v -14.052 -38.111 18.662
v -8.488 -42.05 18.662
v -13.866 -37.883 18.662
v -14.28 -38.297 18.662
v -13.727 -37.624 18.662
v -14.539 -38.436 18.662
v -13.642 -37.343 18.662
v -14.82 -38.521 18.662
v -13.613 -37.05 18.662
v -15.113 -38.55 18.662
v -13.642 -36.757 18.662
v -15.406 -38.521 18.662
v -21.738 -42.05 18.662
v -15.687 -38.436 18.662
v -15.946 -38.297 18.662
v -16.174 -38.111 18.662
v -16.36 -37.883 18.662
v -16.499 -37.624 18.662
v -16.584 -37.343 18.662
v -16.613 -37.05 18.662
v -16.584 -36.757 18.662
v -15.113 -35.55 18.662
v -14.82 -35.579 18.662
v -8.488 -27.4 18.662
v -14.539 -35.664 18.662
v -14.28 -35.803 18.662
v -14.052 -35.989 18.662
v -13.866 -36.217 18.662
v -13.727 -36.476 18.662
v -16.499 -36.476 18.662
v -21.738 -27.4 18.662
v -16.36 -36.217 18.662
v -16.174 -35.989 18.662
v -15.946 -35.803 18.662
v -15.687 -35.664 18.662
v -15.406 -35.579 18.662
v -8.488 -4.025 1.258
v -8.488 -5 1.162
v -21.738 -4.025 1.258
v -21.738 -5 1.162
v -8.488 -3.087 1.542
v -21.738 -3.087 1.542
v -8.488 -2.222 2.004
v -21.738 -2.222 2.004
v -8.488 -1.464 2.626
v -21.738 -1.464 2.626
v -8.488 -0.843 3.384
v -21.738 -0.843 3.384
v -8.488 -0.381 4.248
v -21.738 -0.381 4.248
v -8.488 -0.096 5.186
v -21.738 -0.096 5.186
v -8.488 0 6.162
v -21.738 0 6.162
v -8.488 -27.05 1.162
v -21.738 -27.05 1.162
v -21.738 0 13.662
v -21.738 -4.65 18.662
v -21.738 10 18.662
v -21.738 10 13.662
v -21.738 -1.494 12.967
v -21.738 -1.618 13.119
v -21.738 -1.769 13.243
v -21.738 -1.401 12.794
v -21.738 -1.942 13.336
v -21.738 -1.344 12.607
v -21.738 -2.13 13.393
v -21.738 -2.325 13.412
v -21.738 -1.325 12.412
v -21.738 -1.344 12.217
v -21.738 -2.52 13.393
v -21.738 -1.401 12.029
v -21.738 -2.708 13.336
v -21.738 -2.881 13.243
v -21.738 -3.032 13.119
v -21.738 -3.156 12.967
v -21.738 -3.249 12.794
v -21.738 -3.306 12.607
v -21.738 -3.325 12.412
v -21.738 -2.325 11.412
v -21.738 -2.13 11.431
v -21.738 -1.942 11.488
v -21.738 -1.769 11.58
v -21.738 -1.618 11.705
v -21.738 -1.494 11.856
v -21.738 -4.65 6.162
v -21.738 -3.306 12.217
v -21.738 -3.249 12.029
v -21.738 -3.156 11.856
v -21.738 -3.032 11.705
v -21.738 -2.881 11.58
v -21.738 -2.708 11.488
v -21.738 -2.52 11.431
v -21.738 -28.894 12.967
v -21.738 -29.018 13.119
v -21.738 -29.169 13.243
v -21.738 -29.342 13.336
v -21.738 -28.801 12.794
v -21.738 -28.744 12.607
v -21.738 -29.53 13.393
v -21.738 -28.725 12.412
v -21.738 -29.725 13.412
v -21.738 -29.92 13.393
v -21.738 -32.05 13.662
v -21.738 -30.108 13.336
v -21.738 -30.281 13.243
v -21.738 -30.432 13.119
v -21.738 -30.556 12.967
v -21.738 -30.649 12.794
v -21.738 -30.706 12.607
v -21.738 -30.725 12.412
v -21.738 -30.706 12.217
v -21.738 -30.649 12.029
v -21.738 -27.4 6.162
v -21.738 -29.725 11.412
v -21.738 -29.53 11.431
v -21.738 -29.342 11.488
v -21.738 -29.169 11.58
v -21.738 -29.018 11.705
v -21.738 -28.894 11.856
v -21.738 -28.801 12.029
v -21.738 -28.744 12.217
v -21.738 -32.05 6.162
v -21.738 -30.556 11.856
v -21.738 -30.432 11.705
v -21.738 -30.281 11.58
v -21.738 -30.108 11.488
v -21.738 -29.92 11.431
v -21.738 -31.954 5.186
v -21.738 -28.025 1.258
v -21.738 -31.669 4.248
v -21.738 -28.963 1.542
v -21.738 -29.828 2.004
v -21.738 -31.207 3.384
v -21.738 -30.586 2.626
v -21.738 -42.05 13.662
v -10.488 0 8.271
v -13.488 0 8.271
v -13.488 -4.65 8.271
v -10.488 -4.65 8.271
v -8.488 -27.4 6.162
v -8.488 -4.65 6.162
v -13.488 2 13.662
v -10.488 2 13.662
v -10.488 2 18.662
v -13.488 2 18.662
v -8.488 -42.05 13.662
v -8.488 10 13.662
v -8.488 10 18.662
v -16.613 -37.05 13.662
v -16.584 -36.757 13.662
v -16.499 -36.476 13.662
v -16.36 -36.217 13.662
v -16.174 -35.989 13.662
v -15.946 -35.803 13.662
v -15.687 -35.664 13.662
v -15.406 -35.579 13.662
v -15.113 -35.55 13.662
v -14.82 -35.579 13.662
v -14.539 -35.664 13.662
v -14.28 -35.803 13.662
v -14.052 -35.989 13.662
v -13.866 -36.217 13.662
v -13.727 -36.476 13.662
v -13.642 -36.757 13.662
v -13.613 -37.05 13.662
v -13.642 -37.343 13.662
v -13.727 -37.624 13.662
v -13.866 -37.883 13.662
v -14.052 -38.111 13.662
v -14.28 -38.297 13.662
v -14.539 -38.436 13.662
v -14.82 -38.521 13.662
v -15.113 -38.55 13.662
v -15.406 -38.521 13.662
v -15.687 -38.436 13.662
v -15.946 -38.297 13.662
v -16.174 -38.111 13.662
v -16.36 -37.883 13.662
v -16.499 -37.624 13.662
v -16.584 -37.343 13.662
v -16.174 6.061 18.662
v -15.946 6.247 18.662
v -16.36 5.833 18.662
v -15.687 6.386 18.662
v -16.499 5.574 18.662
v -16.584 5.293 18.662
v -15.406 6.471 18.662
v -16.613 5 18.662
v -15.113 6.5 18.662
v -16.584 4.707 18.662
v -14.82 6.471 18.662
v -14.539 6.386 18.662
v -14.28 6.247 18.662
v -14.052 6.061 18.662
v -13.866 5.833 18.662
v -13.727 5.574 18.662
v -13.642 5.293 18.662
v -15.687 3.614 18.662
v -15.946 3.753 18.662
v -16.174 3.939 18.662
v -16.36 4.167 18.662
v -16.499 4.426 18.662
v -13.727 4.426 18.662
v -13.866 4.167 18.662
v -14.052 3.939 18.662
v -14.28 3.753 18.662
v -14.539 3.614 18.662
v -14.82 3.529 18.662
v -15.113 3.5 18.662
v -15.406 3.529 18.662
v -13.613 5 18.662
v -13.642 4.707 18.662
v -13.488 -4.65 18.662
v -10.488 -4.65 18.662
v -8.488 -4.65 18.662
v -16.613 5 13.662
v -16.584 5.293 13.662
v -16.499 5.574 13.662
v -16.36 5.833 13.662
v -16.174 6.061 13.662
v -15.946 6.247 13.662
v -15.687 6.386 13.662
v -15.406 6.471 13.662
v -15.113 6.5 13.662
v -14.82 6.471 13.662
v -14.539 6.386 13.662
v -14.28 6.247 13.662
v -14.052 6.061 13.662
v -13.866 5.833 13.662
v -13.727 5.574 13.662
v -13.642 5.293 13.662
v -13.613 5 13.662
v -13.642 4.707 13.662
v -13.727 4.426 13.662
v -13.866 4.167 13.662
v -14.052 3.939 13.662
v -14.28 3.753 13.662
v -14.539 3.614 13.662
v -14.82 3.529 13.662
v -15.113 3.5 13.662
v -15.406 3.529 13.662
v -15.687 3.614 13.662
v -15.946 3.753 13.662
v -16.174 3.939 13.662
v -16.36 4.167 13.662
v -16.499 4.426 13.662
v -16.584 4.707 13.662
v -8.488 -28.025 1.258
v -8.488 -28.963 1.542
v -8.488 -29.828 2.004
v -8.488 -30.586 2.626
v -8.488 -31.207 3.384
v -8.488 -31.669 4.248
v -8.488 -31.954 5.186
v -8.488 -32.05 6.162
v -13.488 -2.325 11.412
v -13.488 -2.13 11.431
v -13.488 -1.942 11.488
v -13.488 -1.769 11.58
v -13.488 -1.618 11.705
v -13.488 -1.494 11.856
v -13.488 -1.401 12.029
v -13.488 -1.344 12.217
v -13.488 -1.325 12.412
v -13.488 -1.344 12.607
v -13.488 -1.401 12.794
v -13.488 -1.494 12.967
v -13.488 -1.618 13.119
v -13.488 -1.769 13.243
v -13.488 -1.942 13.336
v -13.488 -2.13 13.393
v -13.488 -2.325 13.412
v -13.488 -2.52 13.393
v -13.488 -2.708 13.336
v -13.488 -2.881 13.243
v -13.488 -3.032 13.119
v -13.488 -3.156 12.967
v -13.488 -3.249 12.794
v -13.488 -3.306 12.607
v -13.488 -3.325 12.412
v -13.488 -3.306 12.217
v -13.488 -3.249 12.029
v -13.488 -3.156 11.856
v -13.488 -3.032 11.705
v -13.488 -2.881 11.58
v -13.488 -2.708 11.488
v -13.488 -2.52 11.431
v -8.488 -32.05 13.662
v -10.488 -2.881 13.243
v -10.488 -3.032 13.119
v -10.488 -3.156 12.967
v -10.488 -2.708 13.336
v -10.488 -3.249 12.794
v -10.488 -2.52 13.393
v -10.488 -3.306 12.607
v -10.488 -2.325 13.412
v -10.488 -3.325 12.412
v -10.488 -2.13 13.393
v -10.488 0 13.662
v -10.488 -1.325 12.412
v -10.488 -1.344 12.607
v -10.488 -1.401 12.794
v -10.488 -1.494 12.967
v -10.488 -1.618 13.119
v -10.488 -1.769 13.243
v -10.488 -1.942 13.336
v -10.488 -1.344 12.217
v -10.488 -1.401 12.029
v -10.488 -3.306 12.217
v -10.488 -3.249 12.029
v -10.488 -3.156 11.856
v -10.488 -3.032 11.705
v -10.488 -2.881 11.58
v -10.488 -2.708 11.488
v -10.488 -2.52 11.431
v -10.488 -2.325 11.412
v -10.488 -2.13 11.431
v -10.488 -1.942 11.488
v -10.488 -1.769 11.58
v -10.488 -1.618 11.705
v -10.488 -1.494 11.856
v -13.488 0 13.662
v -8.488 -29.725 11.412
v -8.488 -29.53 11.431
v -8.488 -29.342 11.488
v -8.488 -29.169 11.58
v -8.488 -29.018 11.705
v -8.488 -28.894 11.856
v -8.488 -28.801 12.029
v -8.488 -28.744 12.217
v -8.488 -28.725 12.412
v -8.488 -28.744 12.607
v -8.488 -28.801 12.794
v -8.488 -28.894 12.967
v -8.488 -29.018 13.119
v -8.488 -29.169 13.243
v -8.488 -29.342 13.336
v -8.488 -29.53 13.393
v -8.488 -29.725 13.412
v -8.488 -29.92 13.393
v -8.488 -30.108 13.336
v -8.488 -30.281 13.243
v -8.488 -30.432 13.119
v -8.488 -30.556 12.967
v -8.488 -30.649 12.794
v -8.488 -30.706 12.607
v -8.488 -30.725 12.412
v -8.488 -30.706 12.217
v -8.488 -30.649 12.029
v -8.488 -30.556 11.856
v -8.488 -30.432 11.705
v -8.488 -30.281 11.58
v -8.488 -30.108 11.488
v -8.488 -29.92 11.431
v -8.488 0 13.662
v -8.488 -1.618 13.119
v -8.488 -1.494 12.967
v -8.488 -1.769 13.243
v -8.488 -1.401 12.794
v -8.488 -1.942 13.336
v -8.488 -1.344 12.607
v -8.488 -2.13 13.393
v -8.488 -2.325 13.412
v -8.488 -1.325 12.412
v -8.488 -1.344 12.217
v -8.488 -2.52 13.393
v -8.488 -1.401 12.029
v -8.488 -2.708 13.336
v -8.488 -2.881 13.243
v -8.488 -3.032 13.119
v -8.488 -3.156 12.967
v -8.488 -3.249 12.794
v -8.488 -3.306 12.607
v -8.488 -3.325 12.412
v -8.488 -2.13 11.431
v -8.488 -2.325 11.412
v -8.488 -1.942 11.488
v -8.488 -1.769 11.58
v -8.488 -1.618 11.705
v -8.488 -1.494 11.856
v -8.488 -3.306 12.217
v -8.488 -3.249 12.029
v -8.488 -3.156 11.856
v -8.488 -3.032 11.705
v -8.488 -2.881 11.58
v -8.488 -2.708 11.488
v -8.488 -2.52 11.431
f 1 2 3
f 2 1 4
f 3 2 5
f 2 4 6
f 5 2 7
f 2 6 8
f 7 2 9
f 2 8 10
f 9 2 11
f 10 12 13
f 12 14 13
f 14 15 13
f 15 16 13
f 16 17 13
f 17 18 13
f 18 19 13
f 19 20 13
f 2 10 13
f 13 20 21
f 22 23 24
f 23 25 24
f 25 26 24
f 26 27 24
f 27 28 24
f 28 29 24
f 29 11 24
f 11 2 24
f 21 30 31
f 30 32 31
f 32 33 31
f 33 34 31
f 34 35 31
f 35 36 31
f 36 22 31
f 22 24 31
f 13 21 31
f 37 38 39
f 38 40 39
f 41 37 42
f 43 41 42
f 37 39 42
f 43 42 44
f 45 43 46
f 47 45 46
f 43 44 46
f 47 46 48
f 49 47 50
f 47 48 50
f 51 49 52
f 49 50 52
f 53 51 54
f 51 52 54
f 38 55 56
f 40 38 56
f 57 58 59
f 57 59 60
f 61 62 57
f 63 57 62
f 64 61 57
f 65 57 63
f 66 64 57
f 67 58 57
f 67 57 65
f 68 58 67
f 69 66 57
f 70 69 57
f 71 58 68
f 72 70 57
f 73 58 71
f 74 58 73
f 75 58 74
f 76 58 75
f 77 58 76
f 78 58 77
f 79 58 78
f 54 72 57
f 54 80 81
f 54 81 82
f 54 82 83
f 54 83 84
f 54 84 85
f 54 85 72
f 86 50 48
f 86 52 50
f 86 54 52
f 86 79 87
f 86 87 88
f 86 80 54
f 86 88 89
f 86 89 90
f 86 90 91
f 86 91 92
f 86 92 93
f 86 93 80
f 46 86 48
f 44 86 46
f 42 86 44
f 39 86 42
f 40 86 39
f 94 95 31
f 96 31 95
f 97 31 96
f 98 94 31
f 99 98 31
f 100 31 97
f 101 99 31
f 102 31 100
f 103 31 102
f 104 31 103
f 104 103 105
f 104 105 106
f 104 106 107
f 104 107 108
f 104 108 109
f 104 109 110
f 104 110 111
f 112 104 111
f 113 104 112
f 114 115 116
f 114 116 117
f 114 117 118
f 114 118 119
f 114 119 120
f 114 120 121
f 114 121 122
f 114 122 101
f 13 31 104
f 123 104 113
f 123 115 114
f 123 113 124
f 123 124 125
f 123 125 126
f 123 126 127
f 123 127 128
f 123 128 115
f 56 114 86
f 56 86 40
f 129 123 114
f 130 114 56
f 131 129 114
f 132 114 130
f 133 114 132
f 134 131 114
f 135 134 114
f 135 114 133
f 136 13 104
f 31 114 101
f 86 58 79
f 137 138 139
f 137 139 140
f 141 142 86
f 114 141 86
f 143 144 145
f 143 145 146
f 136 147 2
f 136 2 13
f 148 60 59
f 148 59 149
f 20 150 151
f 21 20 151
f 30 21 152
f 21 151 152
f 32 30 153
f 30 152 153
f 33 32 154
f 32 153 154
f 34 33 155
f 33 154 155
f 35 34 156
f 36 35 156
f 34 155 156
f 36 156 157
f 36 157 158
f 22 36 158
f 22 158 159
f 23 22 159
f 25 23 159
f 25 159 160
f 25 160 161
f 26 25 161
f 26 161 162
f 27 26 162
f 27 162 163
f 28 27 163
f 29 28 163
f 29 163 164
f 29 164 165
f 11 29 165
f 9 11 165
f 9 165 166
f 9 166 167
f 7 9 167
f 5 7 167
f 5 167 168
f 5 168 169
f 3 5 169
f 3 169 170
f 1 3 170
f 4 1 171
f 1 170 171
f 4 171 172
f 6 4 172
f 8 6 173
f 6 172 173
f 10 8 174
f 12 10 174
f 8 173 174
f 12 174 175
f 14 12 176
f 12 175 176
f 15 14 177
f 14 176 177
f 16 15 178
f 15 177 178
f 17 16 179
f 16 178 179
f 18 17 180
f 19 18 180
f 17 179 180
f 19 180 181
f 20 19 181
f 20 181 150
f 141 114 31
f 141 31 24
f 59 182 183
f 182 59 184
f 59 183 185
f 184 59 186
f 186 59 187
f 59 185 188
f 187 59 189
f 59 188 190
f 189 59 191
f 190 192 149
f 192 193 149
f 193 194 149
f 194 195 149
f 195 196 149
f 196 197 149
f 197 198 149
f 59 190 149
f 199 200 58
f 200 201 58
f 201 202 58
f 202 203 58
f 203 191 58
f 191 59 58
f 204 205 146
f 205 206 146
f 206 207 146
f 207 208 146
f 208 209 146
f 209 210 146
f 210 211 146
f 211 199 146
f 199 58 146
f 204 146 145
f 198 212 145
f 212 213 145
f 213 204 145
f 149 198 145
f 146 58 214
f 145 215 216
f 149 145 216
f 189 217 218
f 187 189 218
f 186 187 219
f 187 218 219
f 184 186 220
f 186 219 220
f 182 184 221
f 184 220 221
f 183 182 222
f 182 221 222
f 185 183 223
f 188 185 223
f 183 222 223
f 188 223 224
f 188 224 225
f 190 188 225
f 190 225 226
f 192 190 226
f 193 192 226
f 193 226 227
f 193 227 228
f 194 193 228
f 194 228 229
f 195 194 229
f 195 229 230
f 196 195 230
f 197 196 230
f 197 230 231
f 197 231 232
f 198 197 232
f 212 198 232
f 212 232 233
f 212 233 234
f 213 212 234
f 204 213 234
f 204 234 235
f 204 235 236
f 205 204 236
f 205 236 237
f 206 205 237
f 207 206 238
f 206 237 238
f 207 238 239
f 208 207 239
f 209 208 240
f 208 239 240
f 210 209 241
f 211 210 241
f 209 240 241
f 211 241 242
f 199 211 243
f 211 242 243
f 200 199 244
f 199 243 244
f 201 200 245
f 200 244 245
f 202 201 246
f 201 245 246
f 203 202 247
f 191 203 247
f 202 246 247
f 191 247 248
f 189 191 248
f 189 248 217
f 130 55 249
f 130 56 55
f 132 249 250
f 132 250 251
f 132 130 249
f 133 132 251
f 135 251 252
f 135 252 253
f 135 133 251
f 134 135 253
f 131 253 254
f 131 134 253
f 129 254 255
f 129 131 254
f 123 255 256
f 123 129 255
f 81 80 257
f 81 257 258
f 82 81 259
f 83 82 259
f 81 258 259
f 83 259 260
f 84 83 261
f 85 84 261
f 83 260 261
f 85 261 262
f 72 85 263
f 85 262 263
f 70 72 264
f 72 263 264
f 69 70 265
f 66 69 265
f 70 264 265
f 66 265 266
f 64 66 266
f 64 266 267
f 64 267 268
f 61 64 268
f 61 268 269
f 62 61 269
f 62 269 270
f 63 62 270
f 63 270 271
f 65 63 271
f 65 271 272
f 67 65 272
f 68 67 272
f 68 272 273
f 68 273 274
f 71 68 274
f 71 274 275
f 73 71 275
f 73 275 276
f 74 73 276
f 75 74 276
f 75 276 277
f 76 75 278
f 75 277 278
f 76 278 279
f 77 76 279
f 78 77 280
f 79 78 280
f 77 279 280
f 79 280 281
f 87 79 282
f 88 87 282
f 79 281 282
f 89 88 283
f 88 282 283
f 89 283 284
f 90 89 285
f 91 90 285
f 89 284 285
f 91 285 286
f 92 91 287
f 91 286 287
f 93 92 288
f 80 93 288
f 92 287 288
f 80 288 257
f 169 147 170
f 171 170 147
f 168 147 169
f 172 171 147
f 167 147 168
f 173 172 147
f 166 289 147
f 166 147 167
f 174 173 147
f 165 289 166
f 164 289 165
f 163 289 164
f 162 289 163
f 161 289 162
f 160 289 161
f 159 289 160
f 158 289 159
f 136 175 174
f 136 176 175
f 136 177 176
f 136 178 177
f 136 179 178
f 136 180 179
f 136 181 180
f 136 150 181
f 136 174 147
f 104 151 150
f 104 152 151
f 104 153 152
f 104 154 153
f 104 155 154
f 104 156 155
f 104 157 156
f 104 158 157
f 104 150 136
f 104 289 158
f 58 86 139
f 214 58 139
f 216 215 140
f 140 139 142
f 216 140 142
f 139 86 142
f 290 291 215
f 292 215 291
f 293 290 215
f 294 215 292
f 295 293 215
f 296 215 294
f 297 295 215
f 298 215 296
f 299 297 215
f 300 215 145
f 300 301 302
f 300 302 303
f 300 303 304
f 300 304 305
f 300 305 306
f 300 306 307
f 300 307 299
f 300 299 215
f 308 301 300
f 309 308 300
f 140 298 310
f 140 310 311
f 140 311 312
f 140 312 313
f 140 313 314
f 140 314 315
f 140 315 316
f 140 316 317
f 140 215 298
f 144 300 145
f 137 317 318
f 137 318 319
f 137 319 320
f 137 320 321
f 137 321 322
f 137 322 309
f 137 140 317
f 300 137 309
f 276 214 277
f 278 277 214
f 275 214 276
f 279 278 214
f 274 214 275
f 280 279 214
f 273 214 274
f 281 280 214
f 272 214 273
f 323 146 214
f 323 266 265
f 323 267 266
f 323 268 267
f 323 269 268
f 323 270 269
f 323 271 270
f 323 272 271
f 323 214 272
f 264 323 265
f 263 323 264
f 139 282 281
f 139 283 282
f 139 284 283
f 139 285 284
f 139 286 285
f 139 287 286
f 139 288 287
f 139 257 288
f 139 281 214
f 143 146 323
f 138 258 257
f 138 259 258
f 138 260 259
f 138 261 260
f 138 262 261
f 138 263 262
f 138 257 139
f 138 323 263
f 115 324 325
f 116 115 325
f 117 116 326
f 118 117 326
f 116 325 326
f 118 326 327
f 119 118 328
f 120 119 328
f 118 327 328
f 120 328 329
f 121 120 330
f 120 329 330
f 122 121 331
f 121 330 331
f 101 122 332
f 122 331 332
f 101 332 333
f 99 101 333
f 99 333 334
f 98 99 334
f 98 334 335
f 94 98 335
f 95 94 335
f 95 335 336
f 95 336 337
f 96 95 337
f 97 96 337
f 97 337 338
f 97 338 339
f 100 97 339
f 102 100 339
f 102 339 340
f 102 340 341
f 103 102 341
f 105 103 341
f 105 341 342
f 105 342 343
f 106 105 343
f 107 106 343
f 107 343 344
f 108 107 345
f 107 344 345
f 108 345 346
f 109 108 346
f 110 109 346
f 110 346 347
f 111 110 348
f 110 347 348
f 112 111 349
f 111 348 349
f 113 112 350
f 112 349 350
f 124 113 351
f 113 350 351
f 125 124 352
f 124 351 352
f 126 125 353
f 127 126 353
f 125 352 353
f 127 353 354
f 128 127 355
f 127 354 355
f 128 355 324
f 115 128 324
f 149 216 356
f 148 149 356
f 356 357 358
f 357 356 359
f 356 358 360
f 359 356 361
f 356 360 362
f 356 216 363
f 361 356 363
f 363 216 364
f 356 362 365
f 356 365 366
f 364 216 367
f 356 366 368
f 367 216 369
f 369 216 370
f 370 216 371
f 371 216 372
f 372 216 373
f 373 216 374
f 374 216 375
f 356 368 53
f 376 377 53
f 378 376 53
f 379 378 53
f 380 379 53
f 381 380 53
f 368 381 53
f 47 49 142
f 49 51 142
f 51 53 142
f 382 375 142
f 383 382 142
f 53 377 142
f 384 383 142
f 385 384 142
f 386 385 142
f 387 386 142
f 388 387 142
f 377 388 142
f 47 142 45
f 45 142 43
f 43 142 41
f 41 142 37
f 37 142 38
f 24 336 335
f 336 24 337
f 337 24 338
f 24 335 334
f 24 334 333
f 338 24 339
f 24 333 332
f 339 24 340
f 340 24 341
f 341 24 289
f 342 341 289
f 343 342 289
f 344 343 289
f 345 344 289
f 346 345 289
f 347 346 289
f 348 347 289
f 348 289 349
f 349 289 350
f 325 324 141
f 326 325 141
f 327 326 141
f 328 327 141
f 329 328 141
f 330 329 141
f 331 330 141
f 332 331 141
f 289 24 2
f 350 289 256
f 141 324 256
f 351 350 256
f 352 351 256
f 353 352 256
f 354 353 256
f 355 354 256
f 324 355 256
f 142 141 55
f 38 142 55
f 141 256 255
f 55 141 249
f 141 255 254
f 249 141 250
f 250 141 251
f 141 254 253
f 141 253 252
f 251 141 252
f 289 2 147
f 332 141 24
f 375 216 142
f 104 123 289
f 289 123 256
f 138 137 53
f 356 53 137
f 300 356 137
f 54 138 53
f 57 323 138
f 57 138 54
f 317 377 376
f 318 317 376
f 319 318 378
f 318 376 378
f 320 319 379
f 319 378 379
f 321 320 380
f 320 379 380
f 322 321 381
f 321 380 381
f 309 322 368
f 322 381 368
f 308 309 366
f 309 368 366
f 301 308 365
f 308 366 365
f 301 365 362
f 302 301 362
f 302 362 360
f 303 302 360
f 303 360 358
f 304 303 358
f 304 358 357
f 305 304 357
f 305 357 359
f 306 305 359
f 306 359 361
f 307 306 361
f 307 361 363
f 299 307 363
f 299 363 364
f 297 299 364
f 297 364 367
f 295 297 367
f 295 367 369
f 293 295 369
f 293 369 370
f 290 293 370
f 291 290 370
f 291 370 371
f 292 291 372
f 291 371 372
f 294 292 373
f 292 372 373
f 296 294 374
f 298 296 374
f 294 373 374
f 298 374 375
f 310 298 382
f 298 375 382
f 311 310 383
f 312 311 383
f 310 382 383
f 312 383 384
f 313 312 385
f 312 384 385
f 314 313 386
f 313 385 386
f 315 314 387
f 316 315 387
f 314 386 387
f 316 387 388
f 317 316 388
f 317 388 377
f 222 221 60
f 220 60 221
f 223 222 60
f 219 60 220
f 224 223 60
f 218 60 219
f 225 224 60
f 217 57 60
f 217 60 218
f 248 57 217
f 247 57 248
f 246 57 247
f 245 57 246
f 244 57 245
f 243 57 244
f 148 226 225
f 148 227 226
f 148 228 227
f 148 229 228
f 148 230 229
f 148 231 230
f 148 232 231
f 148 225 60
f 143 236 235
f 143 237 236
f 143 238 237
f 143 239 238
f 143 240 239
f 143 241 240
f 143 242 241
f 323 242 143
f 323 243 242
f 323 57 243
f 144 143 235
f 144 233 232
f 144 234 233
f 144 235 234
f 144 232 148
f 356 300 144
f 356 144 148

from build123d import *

# Parameters (mm, degrees)
ESBO_O1_W                = 13.25
ESBO_O1_H                = 12.5
RESSALTO_EXTRUS_O1_DEPTH = 4.65
ESBO_O2_W                = 13.25
ESBO_O2_H                = 32.05
RESSALTO_EXTRUS_O2_DEPTH = 5
ESBO_O3_W                = 13.25
ESBO_O3_H                = 4.65
RESSALTO_EXTRUS_O3_DEPTH = 12.5
ESBO_O4_W                = 13.25
ESBO_O4_H                = 5
RESSALTO_EXTRUS_O4_DEPTH = 10
ESBO_O5_W                = 13.25
ESBO_O5_H                = 5
RESSALTO_EXTRUS_O5_DEPTH = 10
ESBO_O6_R                = 1.5
CORTE_EXTRUS_O1_DEPTH    = 10
ESBO_O7_R                = 1
CORTE_EXTRUS_O2_DEPTH    = 14.25
ESBO_O8_R                = 1
CORTE_EXTRUS_O3_DEPTH    = 14.25
ESBO_O9_W                = 3
ESBO_O9_H                = 10.390977072
CORTE_EXTRUS_O4_DEPTH    = 10
ESBO_O10_W               = 3
ESBO_O10_H               = 2
CORTE_EXTRUS_O5_DEPTH    = 10
FILETE1_R                = 5
FILETE2_R                = 5


with BuildPart() as part:
    # Esboço1 → Ressalto-extrusão1 (new body)
    with BuildSketch(Plane(origin=(0, 0, 0), x_dir=(1, 0, 0), z_dir=(0, 1, 0))):
        with Locations((-15.112918198, -12.411797698)):
            Rectangle(ESBO_O1_W, ESBO_O1_H)
    extrude(amount=-RESSALTO_EXTRUS_O1_DEPTH)

    # Esboço2 → Ressalto-extrusão2 (add)
    with BuildSketch(Plane(origin=(0, 0, 6.161797698), x_dir=(-1, 0, 0), z_dir=(0, 0, -1))):
        with Locations((15.112918198, -16.025)):
            Rectangle(ESBO_O2_W, ESBO_O2_H)
    extrude(amount=RESSALTO_EXTRUS_O2_DEPTH)

    # Esboço3 → Ressalto-extrusão3 (add)
    with BuildSketch(Plane.XY.offset(6.161797698)):
        with Locations((-15.112918198, -29.725)):
            Rectangle(ESBO_O3_W, ESBO_O3_H)
    extrude(amount=RESSALTO_EXTRUS_O3_DEPTH)

    # Esboço4 → Ressalto-extrusão4 (add)
    with BuildSketch(Plane(origin=(0, -32.05, 0), x_dir=(-1, 0, 0), z_dir=(0, -1, 0))):
        with Locations((15.112918198, -16.161797698)):
            Rectangle(ESBO_O4_W, ESBO_O4_H)
    extrude(amount=RESSALTO_EXTRUS_O4_DEPTH)

    # Esboço5 → Ressalto-extrusão5 (add)
    with BuildSketch(Plane(origin=(0, 0, 0), x_dir=(1, 0, 0), z_dir=(0, 1, 0))):
        with Locations((-15.112918198, -16.161797698)):
            Rectangle(ESBO_O5_W, ESBO_O5_H)
    extrude(amount=RESSALTO_EXTRUS_O5_DEPTH)

    # Esboço6 → Corte-extrusão1 (cut)
    with BuildSketch(Plane(origin=(0, 0, 13.661797698), x_dir=(-1, 0, 0), z_dir=(0, 0, -1))):
        with Locations((15.112918198, 5)):
            Circle(ESBO_O6_R)
        with Locations((15.112918198, -37.05)):
            Circle(ESBO_O6_R)
    extrude(amount=-CORTE_EXTRUS_O1_DEPTH, mode=Mode.SUBTRACT)

    # Esboço7 → Corte-extrusão2 (cut, through all)
    with BuildSketch(Plane(origin=(-8.487918198, 0, 0), x_dir=(0, 0, -1), z_dir=(1, 0, 0))):
        with Locations((-12.411797698, -2.325)):
            Circle(ESBO_O7_R)
    extrude(amount=-CORTE_EXTRUS_O2_DEPTH, mode=Mode.SUBTRACT)

    # Esboço8 → Corte-extrusão3 (cut, through all)
    with BuildSketch(Plane(origin=(-8.487918198, 0, 0), x_dir=(0, 0, -1), z_dir=(1, 0, 0))):
        with Locations((-12.411797698, -29.725)):
            Circle(ESBO_O8_R)
    extrude(amount=-CORTE_EXTRUS_O3_DEPTH, mode=Mode.SUBTRACT)

    # Esboço9 → Corte-extrusão4 (cut)
    with BuildSketch(Plane(origin=(0, 0, 0), x_dir=(1, 0, 0), z_dir=(0, 1, 0))):
        with Locations((-11.987918198, -13.466309162)):
            Rectangle(ESBO_O9_W, ESBO_O9_H)
    extrude(amount=-CORTE_EXTRUS_O4_DEPTH, mode=Mode.SUBTRACT)

    # Esboço10 → Corte-extrusão5 (cut)
    with BuildSketch(Plane(origin=(0, 0, 13.661797698), x_dir=(-1, 0, 0), z_dir=(0, 0, -1))):
        with Locations((11.987918198, 1)):
            Rectangle(ESBO_O10_W, ESBO_O10_H)
    extrude(amount=-CORTE_EXTRUS_O5_DEPTH, mode=Mode.SUBTRACT)

    # Filete1
    filete1_edges = [part.edges().sort_by_distance(p)[0] for p in [
        (-15.112918198, 0, 1.161797698),
    ]]
    fillet(filete1_edges, radius=FILETE1_R)

    # Filete2
    filete2_edges = [part.edges().sort_by_distance(p)[0] for p in [
        (-15.112918198, -32.05, 1.161797698),
    ]]
    fillet(filete2_edges, radius=FILETE2_R)


solid = part.part
